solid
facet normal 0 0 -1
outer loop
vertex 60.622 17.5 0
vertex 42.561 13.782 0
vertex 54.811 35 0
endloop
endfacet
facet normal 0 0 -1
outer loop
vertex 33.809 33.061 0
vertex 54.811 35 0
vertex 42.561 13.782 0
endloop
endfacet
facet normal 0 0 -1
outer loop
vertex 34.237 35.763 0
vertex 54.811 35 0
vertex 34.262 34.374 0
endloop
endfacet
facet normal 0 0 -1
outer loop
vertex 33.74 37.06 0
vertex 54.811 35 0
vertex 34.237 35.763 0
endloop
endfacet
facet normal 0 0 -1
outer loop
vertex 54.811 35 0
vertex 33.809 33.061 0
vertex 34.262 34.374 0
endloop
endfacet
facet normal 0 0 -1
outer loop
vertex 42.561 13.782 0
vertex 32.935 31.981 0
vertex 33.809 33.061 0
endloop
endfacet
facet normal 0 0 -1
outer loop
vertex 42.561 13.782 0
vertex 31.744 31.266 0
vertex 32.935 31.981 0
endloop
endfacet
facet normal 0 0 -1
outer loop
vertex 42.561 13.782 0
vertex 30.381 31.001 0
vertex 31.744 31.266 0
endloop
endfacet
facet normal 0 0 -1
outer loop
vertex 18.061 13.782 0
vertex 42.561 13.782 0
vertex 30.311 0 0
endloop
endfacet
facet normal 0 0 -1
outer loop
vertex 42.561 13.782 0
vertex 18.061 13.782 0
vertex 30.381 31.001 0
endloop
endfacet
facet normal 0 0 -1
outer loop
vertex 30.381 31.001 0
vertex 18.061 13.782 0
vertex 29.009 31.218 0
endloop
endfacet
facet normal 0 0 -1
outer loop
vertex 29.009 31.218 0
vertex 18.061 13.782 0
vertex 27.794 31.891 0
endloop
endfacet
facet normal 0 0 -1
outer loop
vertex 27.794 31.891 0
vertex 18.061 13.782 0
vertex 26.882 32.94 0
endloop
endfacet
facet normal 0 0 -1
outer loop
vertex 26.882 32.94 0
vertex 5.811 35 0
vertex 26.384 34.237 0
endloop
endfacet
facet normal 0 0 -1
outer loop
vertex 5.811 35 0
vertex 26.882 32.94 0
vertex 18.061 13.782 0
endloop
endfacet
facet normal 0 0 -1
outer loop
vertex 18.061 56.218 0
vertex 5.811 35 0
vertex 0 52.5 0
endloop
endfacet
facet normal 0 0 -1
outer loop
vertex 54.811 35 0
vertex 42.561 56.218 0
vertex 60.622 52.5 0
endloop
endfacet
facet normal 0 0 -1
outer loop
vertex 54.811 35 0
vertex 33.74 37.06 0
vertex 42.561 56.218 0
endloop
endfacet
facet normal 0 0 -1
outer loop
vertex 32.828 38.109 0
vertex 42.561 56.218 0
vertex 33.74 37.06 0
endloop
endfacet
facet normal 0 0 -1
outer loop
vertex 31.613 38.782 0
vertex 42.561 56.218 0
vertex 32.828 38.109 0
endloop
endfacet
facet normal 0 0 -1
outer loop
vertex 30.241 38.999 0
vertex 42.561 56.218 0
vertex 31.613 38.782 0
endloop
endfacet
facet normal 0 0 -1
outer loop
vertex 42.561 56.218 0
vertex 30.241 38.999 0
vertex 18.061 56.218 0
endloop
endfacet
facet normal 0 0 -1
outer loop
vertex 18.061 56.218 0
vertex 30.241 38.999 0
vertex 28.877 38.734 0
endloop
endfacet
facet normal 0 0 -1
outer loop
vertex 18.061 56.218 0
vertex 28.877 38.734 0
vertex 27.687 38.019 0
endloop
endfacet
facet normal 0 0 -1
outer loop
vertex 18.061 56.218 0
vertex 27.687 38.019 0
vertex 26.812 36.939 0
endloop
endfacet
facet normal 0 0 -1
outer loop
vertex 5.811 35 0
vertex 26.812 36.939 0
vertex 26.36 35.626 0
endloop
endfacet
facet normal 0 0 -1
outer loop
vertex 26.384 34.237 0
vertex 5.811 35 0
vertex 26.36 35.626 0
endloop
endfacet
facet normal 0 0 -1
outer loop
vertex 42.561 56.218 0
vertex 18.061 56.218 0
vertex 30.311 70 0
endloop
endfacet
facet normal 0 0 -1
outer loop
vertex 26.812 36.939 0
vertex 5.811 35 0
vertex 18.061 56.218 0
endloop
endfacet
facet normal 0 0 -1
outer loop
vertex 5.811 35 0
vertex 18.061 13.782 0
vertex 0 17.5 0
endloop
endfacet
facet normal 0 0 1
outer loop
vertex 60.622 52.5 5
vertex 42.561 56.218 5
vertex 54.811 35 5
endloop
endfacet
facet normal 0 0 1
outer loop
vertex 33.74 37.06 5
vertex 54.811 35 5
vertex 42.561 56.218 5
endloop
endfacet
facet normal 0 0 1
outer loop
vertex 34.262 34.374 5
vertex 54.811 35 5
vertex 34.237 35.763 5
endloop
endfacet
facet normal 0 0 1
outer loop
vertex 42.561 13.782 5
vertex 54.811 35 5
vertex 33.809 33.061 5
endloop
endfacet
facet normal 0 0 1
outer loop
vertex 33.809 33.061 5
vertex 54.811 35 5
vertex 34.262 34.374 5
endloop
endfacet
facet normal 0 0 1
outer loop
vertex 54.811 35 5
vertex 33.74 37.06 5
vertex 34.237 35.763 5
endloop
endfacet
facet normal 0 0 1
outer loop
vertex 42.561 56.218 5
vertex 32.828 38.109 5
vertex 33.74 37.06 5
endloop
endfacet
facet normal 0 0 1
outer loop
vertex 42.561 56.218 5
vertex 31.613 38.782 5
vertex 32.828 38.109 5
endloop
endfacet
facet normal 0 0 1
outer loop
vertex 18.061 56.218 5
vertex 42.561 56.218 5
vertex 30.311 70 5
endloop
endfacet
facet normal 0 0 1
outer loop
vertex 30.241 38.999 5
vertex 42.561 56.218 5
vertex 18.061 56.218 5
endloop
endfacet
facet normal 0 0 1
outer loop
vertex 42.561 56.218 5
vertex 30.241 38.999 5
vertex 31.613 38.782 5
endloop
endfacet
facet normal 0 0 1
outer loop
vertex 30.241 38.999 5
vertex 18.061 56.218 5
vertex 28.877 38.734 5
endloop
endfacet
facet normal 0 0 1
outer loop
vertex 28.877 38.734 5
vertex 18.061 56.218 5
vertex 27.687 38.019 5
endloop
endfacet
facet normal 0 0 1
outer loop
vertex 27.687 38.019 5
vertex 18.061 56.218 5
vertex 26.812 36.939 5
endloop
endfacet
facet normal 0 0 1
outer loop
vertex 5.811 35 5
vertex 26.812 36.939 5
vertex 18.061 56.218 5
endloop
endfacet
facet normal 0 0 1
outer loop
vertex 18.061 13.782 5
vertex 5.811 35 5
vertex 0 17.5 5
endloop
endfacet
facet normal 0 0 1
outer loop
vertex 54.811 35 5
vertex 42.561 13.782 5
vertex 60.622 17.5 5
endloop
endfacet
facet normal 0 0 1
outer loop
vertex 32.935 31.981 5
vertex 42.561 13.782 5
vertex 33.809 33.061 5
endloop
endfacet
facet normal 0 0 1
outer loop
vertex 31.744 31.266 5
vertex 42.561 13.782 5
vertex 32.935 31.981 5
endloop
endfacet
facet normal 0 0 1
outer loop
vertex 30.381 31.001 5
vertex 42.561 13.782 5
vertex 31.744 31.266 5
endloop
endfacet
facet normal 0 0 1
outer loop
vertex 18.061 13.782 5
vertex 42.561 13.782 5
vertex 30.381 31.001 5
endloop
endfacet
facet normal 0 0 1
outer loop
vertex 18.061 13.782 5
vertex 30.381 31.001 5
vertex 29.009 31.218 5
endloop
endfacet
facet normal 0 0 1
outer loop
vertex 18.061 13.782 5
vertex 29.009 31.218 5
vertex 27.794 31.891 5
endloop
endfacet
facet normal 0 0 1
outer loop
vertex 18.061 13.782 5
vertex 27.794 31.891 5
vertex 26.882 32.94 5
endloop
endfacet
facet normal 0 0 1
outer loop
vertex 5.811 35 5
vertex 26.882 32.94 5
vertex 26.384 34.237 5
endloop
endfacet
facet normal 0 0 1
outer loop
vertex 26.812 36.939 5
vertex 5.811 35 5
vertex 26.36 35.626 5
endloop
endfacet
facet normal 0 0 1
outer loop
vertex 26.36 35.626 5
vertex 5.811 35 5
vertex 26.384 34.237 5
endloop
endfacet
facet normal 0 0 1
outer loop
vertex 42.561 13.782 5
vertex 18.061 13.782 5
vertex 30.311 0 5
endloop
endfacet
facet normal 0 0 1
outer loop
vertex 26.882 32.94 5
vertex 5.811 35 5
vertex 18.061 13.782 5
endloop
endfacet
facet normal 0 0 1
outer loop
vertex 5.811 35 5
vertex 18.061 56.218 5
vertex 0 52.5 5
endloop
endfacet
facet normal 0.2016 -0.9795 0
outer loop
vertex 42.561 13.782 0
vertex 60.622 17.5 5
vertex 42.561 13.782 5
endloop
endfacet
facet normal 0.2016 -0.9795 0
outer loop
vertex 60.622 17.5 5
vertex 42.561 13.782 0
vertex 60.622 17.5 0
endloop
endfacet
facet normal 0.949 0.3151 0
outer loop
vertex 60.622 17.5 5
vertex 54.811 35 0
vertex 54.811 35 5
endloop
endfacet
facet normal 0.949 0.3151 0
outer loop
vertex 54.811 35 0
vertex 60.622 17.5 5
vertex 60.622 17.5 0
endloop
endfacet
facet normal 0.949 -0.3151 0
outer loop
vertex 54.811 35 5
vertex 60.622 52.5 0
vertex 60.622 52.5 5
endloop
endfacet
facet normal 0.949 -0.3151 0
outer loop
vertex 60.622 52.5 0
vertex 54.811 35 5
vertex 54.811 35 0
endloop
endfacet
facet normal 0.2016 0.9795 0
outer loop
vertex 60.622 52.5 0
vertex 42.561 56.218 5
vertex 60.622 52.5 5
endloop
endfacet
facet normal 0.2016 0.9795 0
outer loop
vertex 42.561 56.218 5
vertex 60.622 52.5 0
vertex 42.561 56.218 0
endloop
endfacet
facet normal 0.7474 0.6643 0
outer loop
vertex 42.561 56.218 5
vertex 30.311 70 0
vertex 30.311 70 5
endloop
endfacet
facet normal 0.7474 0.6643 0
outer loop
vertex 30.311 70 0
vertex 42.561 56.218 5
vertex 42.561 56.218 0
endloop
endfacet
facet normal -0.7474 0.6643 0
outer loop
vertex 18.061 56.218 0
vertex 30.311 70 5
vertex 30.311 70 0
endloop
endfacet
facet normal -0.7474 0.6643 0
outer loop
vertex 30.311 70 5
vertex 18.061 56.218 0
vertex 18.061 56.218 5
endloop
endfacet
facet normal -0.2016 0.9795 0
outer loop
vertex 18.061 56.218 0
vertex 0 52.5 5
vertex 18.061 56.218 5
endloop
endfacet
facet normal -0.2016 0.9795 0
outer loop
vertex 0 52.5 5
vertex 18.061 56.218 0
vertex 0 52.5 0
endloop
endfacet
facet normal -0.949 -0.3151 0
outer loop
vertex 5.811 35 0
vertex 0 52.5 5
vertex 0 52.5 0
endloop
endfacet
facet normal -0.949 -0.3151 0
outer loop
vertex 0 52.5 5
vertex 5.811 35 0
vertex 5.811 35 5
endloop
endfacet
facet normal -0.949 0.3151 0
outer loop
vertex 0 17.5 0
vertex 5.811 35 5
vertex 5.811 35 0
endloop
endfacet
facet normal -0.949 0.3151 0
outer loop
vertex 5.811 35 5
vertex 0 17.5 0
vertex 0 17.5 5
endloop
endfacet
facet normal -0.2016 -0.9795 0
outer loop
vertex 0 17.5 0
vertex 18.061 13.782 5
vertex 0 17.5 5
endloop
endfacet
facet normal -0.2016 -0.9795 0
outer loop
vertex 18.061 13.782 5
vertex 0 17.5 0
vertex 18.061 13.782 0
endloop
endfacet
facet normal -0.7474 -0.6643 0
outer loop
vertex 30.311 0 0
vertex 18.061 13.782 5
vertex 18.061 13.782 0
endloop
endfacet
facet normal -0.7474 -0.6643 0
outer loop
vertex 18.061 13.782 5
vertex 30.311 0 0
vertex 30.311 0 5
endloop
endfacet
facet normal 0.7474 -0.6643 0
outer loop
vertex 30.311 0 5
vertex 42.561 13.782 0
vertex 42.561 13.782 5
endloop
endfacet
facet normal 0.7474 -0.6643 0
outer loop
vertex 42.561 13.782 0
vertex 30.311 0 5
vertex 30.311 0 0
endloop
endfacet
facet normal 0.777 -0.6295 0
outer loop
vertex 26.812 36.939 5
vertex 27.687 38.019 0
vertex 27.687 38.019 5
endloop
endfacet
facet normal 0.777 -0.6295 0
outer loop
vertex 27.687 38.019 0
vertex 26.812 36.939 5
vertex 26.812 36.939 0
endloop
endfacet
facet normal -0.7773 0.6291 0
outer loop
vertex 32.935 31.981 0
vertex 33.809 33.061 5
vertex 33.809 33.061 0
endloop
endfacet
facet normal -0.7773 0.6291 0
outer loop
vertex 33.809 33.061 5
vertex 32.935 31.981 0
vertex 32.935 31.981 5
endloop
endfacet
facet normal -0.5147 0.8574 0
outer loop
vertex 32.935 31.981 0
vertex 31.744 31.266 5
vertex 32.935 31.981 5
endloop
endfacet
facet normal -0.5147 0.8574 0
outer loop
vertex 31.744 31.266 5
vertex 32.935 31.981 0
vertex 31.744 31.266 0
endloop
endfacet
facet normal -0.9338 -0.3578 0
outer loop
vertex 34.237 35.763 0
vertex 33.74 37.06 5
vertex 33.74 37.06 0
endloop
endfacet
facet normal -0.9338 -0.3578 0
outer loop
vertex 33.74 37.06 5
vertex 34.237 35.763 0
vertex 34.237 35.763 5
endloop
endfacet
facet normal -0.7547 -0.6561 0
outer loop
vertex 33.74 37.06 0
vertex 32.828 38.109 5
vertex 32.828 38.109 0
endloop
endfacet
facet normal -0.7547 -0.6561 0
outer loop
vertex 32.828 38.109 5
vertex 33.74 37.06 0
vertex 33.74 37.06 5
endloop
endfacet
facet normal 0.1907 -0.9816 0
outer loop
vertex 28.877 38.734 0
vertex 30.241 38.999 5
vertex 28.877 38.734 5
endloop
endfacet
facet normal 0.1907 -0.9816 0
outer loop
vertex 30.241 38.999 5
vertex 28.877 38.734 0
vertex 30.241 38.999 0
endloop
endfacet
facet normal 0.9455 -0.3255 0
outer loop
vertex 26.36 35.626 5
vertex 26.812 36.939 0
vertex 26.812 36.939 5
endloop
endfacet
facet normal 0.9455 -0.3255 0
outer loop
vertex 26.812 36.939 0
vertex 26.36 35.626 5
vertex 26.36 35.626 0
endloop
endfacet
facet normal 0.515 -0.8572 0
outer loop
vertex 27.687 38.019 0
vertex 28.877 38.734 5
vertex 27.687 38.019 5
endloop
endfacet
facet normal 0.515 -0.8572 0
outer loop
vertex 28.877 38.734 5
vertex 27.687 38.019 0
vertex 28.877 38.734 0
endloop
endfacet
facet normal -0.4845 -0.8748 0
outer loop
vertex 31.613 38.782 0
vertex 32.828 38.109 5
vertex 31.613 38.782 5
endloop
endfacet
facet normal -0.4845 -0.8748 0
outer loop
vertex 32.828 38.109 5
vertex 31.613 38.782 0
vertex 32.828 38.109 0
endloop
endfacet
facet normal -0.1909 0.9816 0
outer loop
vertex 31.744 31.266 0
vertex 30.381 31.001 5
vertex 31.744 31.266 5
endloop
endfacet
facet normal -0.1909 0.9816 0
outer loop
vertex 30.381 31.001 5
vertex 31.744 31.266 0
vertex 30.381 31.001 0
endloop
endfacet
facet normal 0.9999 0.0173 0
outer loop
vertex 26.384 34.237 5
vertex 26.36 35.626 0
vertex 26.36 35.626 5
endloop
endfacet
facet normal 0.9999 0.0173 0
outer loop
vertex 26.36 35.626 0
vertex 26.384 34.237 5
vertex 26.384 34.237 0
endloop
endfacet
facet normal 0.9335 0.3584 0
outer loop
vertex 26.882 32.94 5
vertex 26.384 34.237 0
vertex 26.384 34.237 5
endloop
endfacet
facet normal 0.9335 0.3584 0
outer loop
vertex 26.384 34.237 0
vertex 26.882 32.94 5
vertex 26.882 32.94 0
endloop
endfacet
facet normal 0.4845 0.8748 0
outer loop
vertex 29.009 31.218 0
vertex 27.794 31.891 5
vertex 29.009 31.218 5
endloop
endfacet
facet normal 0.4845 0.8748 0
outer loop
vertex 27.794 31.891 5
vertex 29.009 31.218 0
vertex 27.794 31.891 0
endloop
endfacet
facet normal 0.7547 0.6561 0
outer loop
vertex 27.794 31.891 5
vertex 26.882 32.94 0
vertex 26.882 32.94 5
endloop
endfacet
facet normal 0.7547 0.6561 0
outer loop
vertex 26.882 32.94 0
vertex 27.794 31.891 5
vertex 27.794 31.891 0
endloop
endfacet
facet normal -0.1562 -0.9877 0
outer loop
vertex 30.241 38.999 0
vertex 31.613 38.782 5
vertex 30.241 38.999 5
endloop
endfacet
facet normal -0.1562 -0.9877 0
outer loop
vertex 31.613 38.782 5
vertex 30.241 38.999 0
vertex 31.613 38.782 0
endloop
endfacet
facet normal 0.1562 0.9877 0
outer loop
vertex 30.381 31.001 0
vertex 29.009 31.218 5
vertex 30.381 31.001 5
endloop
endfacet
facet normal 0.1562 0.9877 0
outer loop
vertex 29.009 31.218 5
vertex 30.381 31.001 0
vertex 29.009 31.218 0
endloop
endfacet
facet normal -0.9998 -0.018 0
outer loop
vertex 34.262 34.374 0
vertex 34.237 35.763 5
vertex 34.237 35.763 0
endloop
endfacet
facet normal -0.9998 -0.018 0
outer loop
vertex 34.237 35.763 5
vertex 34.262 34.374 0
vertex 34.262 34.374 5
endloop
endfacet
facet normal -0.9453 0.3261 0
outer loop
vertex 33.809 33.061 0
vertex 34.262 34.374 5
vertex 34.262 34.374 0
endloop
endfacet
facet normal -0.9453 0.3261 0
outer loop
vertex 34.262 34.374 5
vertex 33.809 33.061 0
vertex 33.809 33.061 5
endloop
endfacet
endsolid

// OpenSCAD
$fn = 32;

// ----------------------------------------------------------------------
// Star wheel: 6-point blunt, R35
// ----------------------------------------------------------------------

// --- parameters (mm) ---
n_points = 6;             // number of points / teeth
r_out = 35;               // tip radius
r_in = 24.5;              // root radius
bore_r = 4;               // centre bore radius
plate_t = 5;              // plate thickness, Z (extrusion height)
bore_d = 8;               // centre bore diameter

profile = [[30.311, 70], [18.061, 56.218], [0, 52.5], [5.811, 35], [0, 17.5], [18.061, 13.782], [30.311, 0], [42.561, 13.782], [60.622, 17.5], [54.811, 35], [60.622, 52.5], [42.561, 56.218]];  // primary outline, 12 points, counter clockwise
void_1 = [[34.237, 35.763], [33.74, 37.06], [32.828, 38.109], [31.613, 38.782], [30.241, 38.999], [28.877, 38.734], [27.687, 38.019], [26.812, 36.939], [26.36, 35.626], [26.384, 34.237], [26.882, 32.94], [27.794, 31.891], [29.009, 31.218], [30.381, 31.001], [31.744, 31.266], [32.935, 31.981], [33.809, 33.061], [34.262, 34.374]];  // centre bore, 18 points

// --- the one profile operation ---
difference() {
  linear_extrude(height = plate_t) polygon(points = profile);
  translate([0, 0, -1])
    linear_extrude(height = plate_t + 2) polygon(points = void_1);
}
